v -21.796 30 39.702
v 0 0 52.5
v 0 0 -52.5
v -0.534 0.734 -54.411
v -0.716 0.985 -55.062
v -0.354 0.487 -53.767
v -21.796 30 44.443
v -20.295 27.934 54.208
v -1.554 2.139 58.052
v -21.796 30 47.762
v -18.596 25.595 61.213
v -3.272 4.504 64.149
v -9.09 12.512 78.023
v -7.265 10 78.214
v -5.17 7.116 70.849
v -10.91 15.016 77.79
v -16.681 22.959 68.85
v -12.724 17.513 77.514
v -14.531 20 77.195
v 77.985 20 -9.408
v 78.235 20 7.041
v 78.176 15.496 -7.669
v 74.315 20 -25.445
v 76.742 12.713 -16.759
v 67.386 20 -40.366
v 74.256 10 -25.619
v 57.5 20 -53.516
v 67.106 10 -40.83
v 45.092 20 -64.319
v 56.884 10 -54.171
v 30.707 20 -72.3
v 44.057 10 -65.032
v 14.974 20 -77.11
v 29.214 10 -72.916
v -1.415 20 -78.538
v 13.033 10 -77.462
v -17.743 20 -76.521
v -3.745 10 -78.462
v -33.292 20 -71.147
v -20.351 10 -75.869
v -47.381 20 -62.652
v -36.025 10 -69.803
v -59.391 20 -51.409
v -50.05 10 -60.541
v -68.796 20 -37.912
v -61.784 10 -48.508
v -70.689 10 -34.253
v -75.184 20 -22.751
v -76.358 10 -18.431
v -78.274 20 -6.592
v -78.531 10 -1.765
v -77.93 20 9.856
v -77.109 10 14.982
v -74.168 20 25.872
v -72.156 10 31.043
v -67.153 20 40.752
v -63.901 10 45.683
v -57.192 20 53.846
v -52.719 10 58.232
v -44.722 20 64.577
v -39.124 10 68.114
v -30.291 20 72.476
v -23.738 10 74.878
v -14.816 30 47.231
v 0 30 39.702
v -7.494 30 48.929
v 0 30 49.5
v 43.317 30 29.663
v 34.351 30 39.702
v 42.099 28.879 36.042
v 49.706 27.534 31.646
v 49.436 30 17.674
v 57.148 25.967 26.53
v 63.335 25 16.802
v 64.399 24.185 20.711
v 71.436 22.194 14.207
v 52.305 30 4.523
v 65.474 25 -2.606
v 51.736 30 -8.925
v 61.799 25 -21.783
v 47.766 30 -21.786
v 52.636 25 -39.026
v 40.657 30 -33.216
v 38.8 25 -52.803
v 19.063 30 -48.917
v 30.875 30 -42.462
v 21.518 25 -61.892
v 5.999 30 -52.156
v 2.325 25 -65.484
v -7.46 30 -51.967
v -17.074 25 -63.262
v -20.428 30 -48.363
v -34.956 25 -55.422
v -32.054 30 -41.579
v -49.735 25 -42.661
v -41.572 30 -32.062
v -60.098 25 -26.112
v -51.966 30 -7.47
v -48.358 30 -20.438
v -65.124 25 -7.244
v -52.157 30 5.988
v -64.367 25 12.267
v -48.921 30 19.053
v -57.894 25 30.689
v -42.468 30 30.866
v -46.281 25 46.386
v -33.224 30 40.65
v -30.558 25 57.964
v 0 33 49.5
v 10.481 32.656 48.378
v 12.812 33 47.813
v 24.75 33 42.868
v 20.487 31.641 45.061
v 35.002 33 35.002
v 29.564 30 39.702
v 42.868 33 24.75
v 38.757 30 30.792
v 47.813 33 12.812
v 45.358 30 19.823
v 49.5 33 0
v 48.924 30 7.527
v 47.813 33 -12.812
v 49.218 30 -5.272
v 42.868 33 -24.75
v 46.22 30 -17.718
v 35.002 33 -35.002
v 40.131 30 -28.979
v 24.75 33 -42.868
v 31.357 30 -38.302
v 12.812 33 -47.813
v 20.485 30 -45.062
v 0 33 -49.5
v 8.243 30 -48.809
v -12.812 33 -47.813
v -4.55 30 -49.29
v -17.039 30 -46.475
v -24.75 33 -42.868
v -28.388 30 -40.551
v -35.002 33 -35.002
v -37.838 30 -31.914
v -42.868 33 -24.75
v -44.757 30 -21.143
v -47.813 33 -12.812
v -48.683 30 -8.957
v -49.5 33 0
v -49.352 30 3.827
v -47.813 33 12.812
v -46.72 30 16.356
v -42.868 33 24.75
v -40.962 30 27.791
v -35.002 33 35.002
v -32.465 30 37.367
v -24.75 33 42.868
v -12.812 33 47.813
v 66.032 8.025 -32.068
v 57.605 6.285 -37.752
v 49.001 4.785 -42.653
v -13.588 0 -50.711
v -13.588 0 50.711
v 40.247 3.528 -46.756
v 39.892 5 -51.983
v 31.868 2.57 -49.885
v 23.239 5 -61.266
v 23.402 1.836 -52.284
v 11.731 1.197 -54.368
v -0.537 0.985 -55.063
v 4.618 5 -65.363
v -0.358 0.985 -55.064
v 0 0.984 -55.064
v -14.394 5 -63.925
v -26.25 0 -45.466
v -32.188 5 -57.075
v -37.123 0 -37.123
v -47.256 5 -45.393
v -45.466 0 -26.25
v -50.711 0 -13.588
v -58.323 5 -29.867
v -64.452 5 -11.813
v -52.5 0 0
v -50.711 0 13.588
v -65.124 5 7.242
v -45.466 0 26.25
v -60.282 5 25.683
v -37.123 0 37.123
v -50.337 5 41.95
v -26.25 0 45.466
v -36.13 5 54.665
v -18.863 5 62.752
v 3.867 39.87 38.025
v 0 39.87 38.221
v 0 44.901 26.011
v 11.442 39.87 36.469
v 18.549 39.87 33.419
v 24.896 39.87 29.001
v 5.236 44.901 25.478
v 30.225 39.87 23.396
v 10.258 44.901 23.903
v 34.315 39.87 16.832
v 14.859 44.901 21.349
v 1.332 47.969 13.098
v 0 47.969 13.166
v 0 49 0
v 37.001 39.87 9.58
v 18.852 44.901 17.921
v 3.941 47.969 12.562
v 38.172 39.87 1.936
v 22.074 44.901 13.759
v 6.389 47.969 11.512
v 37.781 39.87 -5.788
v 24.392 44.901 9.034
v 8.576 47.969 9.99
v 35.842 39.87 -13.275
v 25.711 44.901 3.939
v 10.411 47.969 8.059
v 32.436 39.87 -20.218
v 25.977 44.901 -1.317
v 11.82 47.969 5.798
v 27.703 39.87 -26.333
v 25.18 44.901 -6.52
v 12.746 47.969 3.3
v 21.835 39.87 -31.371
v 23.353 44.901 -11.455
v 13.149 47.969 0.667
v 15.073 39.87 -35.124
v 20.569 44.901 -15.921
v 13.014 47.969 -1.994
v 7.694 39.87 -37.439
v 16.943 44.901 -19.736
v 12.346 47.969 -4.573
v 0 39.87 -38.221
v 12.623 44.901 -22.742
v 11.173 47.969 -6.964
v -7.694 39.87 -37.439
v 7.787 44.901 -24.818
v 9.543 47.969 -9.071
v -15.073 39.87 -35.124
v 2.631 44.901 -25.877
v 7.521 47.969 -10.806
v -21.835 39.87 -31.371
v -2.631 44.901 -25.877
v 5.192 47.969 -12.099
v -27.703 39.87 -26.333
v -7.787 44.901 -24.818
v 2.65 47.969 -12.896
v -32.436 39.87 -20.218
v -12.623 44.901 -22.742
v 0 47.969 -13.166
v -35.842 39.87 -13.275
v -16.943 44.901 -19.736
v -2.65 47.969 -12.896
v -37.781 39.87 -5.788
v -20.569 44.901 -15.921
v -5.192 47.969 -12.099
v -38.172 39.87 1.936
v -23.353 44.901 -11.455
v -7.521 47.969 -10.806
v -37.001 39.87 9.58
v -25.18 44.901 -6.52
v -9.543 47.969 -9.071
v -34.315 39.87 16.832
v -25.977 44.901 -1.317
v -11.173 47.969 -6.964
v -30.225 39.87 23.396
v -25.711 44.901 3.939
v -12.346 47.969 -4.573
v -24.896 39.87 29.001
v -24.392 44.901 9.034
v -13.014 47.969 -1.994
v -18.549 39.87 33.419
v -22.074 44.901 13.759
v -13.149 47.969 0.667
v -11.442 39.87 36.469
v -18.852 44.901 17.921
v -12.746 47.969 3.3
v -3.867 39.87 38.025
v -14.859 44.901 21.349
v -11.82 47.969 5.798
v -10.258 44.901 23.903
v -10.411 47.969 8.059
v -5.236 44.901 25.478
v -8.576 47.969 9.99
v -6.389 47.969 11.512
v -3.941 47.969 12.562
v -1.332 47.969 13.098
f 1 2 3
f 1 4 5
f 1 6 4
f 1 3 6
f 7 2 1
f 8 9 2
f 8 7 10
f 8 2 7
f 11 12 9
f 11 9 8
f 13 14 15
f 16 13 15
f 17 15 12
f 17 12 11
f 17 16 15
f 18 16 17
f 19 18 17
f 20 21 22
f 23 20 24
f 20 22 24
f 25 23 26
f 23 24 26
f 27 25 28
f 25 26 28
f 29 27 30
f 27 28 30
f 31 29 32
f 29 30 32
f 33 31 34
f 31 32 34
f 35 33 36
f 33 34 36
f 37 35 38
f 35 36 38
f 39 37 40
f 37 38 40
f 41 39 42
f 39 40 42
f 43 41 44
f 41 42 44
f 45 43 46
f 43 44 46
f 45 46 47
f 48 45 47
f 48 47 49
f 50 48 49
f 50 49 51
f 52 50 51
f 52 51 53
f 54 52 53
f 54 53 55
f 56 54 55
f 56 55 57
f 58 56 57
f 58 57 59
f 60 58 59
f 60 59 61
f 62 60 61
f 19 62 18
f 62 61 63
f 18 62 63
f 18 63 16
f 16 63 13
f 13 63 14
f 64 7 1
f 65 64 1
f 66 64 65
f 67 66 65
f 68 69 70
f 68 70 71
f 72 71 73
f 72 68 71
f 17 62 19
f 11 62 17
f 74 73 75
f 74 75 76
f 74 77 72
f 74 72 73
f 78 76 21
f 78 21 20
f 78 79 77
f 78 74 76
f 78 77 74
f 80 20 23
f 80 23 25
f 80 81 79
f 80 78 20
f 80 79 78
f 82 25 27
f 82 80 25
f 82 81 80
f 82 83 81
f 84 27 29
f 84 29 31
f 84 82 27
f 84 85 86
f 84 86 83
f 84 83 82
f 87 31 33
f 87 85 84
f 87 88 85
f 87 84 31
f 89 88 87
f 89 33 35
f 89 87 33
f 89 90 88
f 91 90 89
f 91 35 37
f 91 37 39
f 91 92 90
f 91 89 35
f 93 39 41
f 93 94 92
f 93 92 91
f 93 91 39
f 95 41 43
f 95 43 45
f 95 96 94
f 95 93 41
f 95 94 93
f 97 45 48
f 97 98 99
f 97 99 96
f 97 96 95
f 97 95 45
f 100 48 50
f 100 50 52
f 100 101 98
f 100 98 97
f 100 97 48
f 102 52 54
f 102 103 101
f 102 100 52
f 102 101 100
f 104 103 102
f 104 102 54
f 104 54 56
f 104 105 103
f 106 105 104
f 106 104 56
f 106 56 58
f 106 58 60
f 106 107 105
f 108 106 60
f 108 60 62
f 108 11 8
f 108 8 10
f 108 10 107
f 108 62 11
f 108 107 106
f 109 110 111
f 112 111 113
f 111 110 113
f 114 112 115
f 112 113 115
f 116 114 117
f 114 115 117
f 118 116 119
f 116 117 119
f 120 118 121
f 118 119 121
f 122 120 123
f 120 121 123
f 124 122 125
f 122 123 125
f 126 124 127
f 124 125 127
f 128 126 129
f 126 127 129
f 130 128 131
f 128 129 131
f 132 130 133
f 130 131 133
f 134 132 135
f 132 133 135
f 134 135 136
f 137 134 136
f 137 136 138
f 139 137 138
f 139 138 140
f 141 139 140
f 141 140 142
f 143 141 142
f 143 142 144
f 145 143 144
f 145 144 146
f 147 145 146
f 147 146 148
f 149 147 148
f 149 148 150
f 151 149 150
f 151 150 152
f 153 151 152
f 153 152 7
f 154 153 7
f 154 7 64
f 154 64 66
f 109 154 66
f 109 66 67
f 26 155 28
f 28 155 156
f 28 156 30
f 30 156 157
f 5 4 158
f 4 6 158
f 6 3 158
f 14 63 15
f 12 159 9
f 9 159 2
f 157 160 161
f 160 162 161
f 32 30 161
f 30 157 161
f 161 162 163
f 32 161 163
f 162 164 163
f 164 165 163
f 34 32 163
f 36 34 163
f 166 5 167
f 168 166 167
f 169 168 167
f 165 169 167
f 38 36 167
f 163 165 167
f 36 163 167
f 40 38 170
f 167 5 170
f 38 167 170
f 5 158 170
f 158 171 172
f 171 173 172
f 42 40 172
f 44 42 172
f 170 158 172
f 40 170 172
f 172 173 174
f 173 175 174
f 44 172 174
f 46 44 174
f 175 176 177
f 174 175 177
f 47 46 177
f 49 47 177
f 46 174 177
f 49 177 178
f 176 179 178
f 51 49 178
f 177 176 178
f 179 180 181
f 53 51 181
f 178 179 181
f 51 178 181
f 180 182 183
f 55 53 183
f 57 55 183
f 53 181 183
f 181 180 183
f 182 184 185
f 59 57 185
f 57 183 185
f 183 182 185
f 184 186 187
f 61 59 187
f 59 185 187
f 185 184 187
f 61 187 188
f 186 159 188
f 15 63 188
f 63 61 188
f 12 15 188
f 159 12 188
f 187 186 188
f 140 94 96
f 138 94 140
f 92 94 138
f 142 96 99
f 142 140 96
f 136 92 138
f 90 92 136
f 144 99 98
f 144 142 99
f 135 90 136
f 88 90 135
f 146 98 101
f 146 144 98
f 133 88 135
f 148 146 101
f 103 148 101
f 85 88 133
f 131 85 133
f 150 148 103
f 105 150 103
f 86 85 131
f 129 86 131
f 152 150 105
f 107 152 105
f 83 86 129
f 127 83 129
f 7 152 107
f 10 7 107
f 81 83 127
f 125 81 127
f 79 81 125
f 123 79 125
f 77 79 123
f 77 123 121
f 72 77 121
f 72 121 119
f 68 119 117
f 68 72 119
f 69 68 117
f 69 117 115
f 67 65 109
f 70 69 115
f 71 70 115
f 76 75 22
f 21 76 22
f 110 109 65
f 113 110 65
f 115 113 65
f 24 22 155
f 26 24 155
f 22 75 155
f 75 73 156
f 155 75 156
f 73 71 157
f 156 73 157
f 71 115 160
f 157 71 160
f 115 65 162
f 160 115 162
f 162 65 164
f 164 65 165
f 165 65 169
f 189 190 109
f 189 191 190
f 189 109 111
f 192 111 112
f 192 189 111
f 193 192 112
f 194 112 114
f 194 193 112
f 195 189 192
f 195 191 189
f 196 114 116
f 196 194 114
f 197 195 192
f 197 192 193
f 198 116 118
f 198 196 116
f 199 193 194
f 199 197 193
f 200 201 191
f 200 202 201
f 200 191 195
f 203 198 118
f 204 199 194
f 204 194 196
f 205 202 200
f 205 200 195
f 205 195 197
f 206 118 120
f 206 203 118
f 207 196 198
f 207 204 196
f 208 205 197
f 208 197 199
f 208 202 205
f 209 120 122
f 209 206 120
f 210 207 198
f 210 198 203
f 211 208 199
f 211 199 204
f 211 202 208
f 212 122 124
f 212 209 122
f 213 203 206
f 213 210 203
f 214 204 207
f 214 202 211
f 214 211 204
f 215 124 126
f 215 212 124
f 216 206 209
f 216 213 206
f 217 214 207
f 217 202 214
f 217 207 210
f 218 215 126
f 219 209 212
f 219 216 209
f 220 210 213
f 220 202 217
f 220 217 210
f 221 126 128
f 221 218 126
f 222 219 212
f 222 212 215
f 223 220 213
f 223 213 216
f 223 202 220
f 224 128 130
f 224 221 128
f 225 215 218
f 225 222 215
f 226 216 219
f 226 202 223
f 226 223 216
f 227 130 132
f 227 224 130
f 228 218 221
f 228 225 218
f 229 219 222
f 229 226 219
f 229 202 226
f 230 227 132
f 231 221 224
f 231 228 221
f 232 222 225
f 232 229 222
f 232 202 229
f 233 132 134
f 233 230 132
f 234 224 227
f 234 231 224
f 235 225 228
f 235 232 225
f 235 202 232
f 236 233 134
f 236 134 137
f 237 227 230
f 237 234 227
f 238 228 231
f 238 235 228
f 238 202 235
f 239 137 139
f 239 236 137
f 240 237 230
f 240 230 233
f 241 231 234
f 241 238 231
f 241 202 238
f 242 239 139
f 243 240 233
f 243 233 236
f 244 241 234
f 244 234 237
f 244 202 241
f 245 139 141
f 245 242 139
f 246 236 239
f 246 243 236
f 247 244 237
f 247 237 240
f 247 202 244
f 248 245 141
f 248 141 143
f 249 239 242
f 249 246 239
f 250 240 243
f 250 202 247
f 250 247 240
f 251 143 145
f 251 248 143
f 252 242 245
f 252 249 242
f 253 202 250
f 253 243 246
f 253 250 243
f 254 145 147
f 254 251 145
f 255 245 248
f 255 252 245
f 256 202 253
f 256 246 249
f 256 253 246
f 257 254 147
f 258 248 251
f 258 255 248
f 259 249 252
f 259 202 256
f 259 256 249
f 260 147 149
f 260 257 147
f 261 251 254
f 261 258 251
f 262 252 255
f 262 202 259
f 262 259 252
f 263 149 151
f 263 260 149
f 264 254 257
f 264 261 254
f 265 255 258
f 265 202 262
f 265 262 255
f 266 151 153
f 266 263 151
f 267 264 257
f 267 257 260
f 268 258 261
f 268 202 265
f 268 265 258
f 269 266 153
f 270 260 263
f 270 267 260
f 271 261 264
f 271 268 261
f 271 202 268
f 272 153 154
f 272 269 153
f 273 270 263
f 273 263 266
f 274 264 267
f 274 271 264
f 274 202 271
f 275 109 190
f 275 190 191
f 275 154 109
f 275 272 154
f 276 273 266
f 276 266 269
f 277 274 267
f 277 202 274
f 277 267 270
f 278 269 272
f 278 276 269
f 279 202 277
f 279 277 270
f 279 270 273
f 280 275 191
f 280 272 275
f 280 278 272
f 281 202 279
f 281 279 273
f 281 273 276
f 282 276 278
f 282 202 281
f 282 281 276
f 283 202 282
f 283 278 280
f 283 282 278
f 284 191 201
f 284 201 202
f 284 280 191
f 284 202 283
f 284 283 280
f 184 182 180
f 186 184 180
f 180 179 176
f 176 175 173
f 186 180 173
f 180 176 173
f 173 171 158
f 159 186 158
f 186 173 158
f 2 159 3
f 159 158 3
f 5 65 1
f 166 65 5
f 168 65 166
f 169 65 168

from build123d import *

# Parameters (mm, degrees)
CROQUIS1_R              = 52.5
SALIENTE_EXTRUIR1_DEPTH = 10
SALIENTE_EXTRUIR1_DRAFT = -69
CROQUIS2_R              = 78.550890647
SALIENTE_EXTRUIR2_DEPTH = 10
CROQUIS3_R              = 78.550890647
SALIENTE_EXTRUIR3_DEPTH = 10
SALIENTE_EXTRUIR3_TAPER = 69
CROQUIS4_R              = 49.5
SALIENTE_EXTRUIR4_DEPTH = 3
C_PULA1_FACE_RADIUS     = 49.5
C_PULA1_HEIGHT          = 16
CORTAR_EXTRUIR1_DEPTH   = 122.414516736
CORTAR_EXTRUIR3_REACH   = 184.352


with BuildPart() as part:
    # Croquis1 → Saliente-Extruir1 (with draft: the straight prism first)
    with BuildSketch(Plane(origin=(0, 0, 0), x_dir=(1, 0, 0), z_dir=(0, 1, 0))):
        Circle(CROQUIS1_R)
    extrude(amount=SALIENTE_EXTRUIR1_DEPTH)
    # Saliente-Extruir1: the draft: its side faces are tilted about the plane it starts from
    saliente_extruir1_sides = [part.faces().sort_by_distance(p)[0] for p in [
        (-52.5, 5, 0),
    ]]
    draft(saliente_extruir1_sides, Plane(origin=(0, 0, 0), x_dir=(1, 0, 0), z_dir=(0, 1, 0)), SALIENTE_EXTRUIR1_DRAFT)

    # Croquis2 → Saliente-Extruir2 (add)
    with BuildSketch(Plane(origin=(0, 10, 0), x_dir=(1, 0, 0), z_dir=(0, 1, 0))):
        with Locations(Location((0, 0, 0), (0, 0, 270))):
            Circle(CROQUIS2_R)
    extrude(amount=SALIENTE_EXTRUIR2_DEPTH)

    # Croquis3 → Saliente-Extruir3 (add)
    with BuildSketch(Plane(origin=(0, 20, 0), x_dir=(1, 0, 0), z_dir=(0, 1, 0))):
        with Locations(Location((0, 0, 0), (0, 0, 270))):
            Circle(CROQUIS3_R)
    extrude(amount=SALIENTE_EXTRUIR3_DEPTH, taper=SALIENTE_EXTRUIR3_TAPER)

    # Croquis4 → Saliente-Extruir4 (add)
    with BuildSketch(Plane(origin=(0, 30, 0), x_dir=(1, 0, 0), z_dir=(0, 1, 0))):
        with Locations(Location((0, 0, 0), (0, 0, 270))):
            Circle(CROQUIS4_R)
    extrude(amount=SALIENTE_EXTRUIR4_DEPTH)

    # Cúpula1: a dome of height H over a round flat face of radius A is a cap of a sphere of radius (A * A + H * H) / (2 * H)
    c_pula1_r = (C_PULA1_FACE_RADIUS * C_PULA1_FACE_RADIUS + C_PULA1_HEIGHT * C_PULA1_HEIGHT) / (2 * C_PULA1_HEIGHT)
    c_pula1_base = Plane((0, 33, 0), z_dir=(0, 1, 0))
    with Locations(c_pula1_base.offset(C_PULA1_HEIGHT - c_pula1_r)):
        c_pula1_ball = Sphere(c_pula1_r, mode=Mode.PRIVATE)
    add(split(c_pula1_ball, bisect_by=c_pula1_base, keep=Keep.TOP, mode=Mode.PRIVATE))

    # Croquis6 → Cortar-Extruir1 (cut, through all)
    with BuildSketch(Plane(origin=(0, 0, 0), x_dir=(0, 0, -1), z_dir=(1, 0, 0))):
        Polygon((-49.5, 33), (55.064393683, 0.984378507), (52.5, 0), (-52.5, 0), (-78.550890647, 10), (-78.550890647, 20), align=None)
    extrude(amount=CORTAR_EXTRUIR1_DEPTH, mode=Mode.SUBTRACT)

    # Cortar-Extruir3: up to this plane
    cortar_extruir3_end = Plane(origin=(78.550890647, 33, 49.5), z_dir=(0, -0.9561843075173418, 0.2927653839810668))
    # Croquis9 → Cortar-Extruir3 (cut, up to the surface)
    with BuildSketch(Plane.XY.offset(78.550890647), mode=Mode.PRIVATE) as cortar_extruir3_sk1:
        Polygon((0, 0), (-21.79627584, 30), (0, 30), align=None)
    cortar_extruir3_tool1 = split(extrude(cortar_extruir3_sk1.sketch, amount=-CORTAR_EXTRUIR3_REACH, mode=Mode.PRIVATE), bisect_by=cortar_extruir3_end, keep=Keep.BOTH, mode=Mode.PRIVATE)
    add(cortar_extruir3_tool1.solids().sort_by_distance((-7.265425, 20, 78.550891))[0], mode=Mode.SUBTRACT)


solid = part.part
